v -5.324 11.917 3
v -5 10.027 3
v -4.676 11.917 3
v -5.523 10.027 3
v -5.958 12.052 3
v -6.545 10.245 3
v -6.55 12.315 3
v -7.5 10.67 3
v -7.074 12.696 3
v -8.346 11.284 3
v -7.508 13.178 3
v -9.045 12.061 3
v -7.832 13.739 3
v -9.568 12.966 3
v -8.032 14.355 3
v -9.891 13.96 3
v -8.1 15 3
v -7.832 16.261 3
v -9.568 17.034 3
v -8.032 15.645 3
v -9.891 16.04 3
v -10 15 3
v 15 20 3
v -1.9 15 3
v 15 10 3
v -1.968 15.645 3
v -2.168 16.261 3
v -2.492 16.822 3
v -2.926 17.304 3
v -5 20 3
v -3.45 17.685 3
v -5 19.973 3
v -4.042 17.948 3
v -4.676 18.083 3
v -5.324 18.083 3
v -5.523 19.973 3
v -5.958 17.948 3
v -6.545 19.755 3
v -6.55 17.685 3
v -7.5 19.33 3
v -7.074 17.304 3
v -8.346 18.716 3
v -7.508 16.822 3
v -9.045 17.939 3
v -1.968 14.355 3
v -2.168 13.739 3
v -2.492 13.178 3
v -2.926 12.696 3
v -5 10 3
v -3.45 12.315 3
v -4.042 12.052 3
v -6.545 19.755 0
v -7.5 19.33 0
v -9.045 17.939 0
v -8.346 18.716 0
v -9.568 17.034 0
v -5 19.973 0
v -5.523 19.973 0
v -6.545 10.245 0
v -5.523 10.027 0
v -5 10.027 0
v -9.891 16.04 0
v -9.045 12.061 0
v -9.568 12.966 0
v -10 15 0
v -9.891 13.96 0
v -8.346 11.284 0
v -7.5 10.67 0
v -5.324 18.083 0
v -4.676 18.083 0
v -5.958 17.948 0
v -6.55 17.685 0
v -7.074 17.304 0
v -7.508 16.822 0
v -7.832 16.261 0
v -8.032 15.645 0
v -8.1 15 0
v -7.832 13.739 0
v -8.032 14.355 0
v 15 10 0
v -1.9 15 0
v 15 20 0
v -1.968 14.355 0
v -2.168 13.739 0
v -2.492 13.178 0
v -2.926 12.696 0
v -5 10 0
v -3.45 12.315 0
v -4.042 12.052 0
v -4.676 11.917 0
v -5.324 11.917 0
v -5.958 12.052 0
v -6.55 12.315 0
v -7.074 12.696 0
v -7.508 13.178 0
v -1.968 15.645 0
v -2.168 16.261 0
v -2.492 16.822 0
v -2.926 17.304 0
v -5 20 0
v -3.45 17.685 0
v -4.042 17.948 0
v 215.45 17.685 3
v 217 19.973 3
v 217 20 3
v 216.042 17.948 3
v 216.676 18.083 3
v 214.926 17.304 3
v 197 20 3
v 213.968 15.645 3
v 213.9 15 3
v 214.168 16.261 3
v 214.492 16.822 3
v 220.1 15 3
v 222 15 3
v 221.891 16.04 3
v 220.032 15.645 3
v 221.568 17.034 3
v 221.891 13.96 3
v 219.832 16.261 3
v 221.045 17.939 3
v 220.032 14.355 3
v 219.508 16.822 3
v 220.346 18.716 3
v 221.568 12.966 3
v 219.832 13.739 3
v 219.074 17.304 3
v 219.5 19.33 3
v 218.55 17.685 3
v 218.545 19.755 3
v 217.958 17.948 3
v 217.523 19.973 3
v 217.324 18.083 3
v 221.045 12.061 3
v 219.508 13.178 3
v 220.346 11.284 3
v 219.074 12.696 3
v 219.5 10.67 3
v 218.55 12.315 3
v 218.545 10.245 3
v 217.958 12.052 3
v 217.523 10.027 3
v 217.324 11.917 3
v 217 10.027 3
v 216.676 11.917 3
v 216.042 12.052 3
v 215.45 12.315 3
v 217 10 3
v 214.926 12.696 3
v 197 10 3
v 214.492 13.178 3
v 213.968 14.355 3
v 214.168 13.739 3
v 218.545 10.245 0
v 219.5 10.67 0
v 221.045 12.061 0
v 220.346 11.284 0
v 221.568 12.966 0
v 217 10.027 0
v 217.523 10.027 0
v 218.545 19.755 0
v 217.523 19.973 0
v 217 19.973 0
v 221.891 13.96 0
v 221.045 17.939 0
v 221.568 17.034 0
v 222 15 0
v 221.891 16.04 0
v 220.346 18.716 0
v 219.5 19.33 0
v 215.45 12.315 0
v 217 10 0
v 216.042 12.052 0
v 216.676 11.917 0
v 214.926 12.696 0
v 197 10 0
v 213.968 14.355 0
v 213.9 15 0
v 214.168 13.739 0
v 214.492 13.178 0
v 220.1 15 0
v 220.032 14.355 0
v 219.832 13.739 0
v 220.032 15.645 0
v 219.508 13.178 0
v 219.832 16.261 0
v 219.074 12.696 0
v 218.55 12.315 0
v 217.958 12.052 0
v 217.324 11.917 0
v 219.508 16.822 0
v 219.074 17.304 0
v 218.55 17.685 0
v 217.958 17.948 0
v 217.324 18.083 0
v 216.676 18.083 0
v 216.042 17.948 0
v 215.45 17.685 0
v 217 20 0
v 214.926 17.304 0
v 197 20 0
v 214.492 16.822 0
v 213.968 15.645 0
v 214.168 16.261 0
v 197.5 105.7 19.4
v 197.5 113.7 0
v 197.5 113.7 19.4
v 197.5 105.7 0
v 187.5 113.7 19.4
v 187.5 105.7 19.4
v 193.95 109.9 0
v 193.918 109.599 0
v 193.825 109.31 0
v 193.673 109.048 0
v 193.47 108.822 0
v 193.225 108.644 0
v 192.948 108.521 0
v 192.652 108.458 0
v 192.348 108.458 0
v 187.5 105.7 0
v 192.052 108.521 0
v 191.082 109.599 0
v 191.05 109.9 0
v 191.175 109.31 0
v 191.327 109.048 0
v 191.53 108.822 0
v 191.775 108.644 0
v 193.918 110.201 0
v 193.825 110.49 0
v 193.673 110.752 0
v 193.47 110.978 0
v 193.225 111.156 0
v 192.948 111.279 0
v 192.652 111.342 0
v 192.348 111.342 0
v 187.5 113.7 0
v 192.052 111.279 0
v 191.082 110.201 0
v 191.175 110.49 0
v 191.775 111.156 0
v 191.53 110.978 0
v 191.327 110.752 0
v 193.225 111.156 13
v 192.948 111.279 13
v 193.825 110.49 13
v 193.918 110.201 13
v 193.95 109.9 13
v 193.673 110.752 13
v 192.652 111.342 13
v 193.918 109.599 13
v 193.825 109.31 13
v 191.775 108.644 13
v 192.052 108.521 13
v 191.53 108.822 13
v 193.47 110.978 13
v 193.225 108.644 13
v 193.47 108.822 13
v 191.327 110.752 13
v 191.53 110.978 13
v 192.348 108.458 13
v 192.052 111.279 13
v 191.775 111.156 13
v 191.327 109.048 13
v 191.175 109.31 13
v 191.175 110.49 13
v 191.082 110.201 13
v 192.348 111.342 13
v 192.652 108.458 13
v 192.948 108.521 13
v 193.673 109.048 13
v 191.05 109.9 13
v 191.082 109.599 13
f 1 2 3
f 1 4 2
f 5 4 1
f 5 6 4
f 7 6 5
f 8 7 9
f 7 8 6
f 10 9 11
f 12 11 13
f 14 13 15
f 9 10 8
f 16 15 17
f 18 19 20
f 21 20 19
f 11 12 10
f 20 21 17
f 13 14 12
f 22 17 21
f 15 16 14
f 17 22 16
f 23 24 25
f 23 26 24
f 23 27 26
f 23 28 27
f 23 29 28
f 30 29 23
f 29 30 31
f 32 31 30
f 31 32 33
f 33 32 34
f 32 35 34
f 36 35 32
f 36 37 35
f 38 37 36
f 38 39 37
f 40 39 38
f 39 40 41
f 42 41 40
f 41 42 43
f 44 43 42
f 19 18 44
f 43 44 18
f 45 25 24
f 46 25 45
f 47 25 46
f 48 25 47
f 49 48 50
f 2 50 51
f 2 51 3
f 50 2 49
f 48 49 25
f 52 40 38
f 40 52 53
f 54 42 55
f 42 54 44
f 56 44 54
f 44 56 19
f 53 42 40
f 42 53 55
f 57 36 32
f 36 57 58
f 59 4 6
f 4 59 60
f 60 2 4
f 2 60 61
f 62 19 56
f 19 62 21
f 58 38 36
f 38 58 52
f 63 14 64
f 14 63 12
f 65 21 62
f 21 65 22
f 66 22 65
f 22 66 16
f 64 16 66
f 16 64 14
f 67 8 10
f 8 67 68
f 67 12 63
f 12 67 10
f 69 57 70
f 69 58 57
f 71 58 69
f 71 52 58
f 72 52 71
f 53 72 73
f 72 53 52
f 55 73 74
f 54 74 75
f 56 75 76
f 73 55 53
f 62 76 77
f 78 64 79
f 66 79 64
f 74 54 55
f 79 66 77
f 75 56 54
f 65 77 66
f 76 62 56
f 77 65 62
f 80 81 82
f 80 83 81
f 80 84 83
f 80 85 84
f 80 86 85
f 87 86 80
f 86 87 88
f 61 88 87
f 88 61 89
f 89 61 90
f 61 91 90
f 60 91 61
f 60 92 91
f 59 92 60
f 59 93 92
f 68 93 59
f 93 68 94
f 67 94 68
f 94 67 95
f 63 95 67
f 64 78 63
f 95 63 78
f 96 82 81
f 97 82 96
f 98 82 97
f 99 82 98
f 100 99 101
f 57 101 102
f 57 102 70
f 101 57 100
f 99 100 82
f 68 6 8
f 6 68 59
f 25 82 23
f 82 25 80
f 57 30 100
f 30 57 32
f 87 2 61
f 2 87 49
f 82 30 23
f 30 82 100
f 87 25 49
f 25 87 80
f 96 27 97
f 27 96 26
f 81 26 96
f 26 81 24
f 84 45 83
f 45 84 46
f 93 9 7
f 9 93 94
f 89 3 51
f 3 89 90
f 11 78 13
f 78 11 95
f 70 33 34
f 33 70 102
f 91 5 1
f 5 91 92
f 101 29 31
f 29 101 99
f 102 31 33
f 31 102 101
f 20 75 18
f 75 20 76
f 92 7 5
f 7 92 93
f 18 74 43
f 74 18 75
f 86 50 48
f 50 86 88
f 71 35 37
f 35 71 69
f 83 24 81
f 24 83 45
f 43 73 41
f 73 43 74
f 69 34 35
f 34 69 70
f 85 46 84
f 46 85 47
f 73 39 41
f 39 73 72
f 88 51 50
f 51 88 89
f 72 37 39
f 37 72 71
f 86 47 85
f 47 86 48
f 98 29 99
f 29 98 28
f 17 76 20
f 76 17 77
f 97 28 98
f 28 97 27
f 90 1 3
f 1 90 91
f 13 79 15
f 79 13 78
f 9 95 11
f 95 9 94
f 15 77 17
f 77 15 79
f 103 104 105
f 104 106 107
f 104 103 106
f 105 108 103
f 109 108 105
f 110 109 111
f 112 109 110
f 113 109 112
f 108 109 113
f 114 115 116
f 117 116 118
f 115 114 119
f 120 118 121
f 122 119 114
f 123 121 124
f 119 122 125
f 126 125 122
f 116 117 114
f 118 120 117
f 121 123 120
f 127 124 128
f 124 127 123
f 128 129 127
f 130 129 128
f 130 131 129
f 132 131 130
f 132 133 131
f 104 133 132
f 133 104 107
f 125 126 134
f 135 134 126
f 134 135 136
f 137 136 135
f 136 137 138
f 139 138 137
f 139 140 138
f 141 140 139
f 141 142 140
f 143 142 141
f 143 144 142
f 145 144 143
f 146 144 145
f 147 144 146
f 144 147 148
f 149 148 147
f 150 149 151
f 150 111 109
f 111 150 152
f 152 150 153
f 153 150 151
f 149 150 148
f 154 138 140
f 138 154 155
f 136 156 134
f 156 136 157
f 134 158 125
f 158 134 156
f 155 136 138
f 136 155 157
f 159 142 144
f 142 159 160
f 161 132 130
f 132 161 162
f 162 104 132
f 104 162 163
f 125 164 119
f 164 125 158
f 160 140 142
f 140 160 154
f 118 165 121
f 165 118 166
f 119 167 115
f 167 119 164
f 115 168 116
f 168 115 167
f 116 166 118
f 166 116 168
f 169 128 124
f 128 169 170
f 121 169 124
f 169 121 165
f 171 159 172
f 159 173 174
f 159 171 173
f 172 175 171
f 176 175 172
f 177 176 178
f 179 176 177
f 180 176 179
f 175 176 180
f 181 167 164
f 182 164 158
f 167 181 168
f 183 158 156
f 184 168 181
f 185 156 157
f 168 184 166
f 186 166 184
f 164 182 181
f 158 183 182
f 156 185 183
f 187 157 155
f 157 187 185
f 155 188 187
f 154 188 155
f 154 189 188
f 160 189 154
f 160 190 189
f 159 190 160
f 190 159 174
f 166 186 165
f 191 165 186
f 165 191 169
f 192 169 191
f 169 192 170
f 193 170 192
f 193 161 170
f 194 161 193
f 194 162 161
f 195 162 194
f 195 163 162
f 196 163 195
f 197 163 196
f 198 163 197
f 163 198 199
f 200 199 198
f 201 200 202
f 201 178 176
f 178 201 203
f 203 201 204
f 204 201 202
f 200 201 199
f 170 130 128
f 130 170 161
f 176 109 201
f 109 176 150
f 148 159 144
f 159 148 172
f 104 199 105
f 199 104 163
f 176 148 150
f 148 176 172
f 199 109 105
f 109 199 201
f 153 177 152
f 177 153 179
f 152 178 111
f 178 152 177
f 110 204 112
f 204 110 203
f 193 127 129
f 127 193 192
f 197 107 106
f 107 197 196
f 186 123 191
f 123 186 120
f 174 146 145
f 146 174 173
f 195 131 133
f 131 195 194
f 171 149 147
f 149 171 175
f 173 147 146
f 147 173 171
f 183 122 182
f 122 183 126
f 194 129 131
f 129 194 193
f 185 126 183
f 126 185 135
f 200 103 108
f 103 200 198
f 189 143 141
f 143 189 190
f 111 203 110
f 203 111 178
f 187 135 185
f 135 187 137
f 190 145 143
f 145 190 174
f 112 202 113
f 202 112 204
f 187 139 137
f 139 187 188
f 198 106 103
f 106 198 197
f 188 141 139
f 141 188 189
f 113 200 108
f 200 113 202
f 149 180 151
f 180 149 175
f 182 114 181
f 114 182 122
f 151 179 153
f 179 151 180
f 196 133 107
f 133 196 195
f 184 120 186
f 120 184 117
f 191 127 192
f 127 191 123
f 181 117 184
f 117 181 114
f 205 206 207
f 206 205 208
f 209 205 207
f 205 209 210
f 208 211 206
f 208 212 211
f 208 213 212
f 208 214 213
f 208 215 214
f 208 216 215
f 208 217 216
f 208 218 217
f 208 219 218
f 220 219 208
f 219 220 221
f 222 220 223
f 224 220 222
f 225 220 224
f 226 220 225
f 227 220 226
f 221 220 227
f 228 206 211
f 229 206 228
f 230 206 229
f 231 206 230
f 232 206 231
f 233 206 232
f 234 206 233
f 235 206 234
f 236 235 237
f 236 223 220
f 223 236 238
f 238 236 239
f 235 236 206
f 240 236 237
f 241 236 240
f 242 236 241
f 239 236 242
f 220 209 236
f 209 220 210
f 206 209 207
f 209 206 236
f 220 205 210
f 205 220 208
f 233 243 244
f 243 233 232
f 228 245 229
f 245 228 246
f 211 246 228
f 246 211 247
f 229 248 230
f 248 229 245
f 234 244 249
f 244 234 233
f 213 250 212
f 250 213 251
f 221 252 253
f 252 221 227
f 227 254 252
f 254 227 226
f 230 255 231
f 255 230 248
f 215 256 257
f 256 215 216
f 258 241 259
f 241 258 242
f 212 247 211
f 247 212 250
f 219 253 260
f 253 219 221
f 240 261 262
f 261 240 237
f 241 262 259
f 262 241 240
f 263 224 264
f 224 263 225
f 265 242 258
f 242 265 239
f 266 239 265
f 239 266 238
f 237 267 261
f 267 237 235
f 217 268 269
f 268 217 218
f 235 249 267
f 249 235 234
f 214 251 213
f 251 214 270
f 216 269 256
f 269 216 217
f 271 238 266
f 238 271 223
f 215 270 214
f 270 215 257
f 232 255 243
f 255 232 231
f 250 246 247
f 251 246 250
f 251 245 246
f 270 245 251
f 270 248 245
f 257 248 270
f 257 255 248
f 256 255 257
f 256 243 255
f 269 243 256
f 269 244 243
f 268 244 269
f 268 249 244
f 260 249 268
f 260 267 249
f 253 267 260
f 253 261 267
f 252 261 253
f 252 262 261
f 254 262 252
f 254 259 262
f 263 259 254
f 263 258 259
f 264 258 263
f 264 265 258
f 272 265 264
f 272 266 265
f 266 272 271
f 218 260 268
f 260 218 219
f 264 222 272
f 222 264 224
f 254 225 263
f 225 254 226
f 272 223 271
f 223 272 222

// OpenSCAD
//import("./paneldue-v0.stl");


$fn=30;

translate([-5,15,0]) bigBoltSpot();
translate([212+5,15,0]) rotate([0,0,180]) bigBoltSpot();


difference() {
   translate([212.5-20-5,105.7,0]) cube([10,8,19.4]);
   translate([212.5-20,109.9,-2]) cylinder(d=2.9,h=15);
}

module bigBoltSpot() {
   difference() {
      union() {
         cylinder(d=10,h=3);
         translate([0,-5,0]) cube([20,10,3]);
      }
      translate([0,0,-1]) cylinder(d=6.2,h=5);
   }
}
